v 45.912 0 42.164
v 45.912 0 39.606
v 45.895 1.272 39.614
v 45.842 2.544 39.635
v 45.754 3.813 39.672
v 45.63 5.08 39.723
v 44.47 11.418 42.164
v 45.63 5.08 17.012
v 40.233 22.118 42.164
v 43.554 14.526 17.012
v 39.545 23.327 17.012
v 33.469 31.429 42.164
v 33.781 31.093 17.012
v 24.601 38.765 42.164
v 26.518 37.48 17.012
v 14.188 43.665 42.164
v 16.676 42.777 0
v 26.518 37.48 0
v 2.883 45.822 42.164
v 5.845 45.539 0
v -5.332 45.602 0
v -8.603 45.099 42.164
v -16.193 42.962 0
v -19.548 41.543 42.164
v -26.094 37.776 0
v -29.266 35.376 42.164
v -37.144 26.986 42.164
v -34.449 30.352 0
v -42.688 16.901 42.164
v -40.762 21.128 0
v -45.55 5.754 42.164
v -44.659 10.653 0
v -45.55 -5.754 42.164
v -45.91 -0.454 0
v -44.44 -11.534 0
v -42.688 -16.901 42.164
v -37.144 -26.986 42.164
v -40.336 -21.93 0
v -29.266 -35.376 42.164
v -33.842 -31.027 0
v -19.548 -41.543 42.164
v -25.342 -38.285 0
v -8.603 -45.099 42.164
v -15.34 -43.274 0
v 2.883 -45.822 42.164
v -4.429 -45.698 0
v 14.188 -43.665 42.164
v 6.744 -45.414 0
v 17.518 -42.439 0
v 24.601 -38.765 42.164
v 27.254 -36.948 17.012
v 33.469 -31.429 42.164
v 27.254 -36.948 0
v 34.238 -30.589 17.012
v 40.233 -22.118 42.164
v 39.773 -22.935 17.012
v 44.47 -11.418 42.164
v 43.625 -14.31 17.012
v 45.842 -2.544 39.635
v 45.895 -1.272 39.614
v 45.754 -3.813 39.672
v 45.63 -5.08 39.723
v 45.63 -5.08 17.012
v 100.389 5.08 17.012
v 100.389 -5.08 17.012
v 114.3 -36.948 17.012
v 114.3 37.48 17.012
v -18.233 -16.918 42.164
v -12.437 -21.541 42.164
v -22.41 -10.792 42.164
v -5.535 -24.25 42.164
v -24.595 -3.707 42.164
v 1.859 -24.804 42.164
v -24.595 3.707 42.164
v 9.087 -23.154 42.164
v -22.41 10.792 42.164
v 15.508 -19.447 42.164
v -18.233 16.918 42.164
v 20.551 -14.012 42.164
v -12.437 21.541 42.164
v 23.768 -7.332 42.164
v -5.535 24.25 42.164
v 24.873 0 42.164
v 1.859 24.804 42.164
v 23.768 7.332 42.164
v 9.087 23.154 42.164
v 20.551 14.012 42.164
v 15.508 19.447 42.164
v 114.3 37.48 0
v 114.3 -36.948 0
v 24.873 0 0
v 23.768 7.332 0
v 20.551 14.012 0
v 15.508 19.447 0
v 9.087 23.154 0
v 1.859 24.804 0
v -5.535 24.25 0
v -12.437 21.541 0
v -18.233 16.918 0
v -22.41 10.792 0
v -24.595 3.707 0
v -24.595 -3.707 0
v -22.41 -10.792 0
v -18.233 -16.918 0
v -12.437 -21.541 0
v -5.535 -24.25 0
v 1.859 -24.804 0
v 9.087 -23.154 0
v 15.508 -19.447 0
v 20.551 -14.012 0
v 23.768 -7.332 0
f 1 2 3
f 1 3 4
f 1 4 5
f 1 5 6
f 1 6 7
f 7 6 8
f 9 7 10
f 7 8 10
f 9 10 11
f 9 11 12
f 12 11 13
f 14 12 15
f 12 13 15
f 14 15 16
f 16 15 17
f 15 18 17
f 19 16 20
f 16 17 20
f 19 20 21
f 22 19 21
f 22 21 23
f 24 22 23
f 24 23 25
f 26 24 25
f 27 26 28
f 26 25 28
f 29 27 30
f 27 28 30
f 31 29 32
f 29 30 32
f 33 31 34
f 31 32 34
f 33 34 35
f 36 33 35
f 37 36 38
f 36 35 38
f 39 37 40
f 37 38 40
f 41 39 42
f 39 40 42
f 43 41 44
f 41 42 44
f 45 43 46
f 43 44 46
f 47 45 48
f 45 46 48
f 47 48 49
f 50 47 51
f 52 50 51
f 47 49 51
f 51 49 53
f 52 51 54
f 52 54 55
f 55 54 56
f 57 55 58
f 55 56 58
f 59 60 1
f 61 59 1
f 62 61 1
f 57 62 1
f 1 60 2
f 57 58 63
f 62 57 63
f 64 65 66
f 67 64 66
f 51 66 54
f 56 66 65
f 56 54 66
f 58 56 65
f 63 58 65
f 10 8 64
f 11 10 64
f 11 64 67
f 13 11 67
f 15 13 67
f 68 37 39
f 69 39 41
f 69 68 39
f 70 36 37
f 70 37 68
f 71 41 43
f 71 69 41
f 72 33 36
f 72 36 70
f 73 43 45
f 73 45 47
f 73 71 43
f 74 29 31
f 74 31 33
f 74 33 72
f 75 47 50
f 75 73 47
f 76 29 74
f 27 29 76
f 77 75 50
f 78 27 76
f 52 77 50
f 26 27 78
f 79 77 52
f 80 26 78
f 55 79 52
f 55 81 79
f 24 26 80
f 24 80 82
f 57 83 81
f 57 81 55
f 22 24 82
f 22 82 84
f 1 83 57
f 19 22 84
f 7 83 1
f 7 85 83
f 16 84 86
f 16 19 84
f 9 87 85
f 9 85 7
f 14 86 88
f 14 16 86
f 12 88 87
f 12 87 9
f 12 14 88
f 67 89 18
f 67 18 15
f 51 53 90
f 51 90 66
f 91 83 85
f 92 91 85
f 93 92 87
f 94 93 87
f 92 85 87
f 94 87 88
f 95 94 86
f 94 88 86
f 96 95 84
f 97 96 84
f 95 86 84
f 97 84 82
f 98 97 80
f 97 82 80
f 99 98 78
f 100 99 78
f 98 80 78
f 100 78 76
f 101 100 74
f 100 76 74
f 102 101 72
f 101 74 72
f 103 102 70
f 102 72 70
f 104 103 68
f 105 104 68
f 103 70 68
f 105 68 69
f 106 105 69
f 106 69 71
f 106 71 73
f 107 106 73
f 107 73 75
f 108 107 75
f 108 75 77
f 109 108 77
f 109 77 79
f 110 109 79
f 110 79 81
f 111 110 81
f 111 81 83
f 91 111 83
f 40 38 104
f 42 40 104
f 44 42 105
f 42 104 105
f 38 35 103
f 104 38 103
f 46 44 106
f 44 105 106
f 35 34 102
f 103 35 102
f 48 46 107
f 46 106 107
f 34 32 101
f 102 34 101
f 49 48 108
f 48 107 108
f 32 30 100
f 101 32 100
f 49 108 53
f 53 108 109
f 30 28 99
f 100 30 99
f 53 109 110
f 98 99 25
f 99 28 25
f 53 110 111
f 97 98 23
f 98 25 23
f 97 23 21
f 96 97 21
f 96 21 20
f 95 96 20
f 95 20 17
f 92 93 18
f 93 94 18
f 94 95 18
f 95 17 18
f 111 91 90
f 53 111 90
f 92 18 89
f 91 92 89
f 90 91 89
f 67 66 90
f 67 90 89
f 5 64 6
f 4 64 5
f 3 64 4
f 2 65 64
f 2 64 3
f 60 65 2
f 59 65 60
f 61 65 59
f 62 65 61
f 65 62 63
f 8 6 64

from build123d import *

# Parameters (mm, degrees)
F0_R          = 45.9121697242
F1_DEPTH      = 42.164
F2_W          = 74.4279101491
F2_H          = 17.0120932162
F3_DEPTH      = 114.3
F5_DEPTH      = 5.08
F5_DEPTH_BACK = 5.08
F6_R          = 24.8732317419
F7_DEPTH      = 42.165


with BuildPart() as f1:
    # F0 (on Top) → F1 (new body)
    with BuildSketch(Plane.XY):
        Circle(F0_R)
    extrude(amount=F1_DEPTH)

    # F2 (on Right) → F3 (join)
    with BuildSketch(Plane.YZ):
        with Locations((0.265814364, 8.5060466081)):
            Rectangle(F2_W, F2_H)
    extrude(amount=F3_DEPTH)

    # F4 (on Front) → F5 (join, two sides)
    with BuildSketch(Plane.XZ) as f5_sk:
        Polygon((42.707439512, 17.0120932162), (100.3890708089, 17.0120932162), (42.707439512, 40.9353487194), align=None)
    extrude(amount=F5_DEPTH)
    extrude(f5_sk.sketch, amount=-F5_DEPTH_BACK)

    # F6 (on face) → F7 (cut, through all)
    with BuildSketch(Plane.XY.offset(42.164)):
        Circle(F6_R)
    extrude(amount=-F7_DEPTH, mode=Mode.SUBTRACT)


solid = f1.part
